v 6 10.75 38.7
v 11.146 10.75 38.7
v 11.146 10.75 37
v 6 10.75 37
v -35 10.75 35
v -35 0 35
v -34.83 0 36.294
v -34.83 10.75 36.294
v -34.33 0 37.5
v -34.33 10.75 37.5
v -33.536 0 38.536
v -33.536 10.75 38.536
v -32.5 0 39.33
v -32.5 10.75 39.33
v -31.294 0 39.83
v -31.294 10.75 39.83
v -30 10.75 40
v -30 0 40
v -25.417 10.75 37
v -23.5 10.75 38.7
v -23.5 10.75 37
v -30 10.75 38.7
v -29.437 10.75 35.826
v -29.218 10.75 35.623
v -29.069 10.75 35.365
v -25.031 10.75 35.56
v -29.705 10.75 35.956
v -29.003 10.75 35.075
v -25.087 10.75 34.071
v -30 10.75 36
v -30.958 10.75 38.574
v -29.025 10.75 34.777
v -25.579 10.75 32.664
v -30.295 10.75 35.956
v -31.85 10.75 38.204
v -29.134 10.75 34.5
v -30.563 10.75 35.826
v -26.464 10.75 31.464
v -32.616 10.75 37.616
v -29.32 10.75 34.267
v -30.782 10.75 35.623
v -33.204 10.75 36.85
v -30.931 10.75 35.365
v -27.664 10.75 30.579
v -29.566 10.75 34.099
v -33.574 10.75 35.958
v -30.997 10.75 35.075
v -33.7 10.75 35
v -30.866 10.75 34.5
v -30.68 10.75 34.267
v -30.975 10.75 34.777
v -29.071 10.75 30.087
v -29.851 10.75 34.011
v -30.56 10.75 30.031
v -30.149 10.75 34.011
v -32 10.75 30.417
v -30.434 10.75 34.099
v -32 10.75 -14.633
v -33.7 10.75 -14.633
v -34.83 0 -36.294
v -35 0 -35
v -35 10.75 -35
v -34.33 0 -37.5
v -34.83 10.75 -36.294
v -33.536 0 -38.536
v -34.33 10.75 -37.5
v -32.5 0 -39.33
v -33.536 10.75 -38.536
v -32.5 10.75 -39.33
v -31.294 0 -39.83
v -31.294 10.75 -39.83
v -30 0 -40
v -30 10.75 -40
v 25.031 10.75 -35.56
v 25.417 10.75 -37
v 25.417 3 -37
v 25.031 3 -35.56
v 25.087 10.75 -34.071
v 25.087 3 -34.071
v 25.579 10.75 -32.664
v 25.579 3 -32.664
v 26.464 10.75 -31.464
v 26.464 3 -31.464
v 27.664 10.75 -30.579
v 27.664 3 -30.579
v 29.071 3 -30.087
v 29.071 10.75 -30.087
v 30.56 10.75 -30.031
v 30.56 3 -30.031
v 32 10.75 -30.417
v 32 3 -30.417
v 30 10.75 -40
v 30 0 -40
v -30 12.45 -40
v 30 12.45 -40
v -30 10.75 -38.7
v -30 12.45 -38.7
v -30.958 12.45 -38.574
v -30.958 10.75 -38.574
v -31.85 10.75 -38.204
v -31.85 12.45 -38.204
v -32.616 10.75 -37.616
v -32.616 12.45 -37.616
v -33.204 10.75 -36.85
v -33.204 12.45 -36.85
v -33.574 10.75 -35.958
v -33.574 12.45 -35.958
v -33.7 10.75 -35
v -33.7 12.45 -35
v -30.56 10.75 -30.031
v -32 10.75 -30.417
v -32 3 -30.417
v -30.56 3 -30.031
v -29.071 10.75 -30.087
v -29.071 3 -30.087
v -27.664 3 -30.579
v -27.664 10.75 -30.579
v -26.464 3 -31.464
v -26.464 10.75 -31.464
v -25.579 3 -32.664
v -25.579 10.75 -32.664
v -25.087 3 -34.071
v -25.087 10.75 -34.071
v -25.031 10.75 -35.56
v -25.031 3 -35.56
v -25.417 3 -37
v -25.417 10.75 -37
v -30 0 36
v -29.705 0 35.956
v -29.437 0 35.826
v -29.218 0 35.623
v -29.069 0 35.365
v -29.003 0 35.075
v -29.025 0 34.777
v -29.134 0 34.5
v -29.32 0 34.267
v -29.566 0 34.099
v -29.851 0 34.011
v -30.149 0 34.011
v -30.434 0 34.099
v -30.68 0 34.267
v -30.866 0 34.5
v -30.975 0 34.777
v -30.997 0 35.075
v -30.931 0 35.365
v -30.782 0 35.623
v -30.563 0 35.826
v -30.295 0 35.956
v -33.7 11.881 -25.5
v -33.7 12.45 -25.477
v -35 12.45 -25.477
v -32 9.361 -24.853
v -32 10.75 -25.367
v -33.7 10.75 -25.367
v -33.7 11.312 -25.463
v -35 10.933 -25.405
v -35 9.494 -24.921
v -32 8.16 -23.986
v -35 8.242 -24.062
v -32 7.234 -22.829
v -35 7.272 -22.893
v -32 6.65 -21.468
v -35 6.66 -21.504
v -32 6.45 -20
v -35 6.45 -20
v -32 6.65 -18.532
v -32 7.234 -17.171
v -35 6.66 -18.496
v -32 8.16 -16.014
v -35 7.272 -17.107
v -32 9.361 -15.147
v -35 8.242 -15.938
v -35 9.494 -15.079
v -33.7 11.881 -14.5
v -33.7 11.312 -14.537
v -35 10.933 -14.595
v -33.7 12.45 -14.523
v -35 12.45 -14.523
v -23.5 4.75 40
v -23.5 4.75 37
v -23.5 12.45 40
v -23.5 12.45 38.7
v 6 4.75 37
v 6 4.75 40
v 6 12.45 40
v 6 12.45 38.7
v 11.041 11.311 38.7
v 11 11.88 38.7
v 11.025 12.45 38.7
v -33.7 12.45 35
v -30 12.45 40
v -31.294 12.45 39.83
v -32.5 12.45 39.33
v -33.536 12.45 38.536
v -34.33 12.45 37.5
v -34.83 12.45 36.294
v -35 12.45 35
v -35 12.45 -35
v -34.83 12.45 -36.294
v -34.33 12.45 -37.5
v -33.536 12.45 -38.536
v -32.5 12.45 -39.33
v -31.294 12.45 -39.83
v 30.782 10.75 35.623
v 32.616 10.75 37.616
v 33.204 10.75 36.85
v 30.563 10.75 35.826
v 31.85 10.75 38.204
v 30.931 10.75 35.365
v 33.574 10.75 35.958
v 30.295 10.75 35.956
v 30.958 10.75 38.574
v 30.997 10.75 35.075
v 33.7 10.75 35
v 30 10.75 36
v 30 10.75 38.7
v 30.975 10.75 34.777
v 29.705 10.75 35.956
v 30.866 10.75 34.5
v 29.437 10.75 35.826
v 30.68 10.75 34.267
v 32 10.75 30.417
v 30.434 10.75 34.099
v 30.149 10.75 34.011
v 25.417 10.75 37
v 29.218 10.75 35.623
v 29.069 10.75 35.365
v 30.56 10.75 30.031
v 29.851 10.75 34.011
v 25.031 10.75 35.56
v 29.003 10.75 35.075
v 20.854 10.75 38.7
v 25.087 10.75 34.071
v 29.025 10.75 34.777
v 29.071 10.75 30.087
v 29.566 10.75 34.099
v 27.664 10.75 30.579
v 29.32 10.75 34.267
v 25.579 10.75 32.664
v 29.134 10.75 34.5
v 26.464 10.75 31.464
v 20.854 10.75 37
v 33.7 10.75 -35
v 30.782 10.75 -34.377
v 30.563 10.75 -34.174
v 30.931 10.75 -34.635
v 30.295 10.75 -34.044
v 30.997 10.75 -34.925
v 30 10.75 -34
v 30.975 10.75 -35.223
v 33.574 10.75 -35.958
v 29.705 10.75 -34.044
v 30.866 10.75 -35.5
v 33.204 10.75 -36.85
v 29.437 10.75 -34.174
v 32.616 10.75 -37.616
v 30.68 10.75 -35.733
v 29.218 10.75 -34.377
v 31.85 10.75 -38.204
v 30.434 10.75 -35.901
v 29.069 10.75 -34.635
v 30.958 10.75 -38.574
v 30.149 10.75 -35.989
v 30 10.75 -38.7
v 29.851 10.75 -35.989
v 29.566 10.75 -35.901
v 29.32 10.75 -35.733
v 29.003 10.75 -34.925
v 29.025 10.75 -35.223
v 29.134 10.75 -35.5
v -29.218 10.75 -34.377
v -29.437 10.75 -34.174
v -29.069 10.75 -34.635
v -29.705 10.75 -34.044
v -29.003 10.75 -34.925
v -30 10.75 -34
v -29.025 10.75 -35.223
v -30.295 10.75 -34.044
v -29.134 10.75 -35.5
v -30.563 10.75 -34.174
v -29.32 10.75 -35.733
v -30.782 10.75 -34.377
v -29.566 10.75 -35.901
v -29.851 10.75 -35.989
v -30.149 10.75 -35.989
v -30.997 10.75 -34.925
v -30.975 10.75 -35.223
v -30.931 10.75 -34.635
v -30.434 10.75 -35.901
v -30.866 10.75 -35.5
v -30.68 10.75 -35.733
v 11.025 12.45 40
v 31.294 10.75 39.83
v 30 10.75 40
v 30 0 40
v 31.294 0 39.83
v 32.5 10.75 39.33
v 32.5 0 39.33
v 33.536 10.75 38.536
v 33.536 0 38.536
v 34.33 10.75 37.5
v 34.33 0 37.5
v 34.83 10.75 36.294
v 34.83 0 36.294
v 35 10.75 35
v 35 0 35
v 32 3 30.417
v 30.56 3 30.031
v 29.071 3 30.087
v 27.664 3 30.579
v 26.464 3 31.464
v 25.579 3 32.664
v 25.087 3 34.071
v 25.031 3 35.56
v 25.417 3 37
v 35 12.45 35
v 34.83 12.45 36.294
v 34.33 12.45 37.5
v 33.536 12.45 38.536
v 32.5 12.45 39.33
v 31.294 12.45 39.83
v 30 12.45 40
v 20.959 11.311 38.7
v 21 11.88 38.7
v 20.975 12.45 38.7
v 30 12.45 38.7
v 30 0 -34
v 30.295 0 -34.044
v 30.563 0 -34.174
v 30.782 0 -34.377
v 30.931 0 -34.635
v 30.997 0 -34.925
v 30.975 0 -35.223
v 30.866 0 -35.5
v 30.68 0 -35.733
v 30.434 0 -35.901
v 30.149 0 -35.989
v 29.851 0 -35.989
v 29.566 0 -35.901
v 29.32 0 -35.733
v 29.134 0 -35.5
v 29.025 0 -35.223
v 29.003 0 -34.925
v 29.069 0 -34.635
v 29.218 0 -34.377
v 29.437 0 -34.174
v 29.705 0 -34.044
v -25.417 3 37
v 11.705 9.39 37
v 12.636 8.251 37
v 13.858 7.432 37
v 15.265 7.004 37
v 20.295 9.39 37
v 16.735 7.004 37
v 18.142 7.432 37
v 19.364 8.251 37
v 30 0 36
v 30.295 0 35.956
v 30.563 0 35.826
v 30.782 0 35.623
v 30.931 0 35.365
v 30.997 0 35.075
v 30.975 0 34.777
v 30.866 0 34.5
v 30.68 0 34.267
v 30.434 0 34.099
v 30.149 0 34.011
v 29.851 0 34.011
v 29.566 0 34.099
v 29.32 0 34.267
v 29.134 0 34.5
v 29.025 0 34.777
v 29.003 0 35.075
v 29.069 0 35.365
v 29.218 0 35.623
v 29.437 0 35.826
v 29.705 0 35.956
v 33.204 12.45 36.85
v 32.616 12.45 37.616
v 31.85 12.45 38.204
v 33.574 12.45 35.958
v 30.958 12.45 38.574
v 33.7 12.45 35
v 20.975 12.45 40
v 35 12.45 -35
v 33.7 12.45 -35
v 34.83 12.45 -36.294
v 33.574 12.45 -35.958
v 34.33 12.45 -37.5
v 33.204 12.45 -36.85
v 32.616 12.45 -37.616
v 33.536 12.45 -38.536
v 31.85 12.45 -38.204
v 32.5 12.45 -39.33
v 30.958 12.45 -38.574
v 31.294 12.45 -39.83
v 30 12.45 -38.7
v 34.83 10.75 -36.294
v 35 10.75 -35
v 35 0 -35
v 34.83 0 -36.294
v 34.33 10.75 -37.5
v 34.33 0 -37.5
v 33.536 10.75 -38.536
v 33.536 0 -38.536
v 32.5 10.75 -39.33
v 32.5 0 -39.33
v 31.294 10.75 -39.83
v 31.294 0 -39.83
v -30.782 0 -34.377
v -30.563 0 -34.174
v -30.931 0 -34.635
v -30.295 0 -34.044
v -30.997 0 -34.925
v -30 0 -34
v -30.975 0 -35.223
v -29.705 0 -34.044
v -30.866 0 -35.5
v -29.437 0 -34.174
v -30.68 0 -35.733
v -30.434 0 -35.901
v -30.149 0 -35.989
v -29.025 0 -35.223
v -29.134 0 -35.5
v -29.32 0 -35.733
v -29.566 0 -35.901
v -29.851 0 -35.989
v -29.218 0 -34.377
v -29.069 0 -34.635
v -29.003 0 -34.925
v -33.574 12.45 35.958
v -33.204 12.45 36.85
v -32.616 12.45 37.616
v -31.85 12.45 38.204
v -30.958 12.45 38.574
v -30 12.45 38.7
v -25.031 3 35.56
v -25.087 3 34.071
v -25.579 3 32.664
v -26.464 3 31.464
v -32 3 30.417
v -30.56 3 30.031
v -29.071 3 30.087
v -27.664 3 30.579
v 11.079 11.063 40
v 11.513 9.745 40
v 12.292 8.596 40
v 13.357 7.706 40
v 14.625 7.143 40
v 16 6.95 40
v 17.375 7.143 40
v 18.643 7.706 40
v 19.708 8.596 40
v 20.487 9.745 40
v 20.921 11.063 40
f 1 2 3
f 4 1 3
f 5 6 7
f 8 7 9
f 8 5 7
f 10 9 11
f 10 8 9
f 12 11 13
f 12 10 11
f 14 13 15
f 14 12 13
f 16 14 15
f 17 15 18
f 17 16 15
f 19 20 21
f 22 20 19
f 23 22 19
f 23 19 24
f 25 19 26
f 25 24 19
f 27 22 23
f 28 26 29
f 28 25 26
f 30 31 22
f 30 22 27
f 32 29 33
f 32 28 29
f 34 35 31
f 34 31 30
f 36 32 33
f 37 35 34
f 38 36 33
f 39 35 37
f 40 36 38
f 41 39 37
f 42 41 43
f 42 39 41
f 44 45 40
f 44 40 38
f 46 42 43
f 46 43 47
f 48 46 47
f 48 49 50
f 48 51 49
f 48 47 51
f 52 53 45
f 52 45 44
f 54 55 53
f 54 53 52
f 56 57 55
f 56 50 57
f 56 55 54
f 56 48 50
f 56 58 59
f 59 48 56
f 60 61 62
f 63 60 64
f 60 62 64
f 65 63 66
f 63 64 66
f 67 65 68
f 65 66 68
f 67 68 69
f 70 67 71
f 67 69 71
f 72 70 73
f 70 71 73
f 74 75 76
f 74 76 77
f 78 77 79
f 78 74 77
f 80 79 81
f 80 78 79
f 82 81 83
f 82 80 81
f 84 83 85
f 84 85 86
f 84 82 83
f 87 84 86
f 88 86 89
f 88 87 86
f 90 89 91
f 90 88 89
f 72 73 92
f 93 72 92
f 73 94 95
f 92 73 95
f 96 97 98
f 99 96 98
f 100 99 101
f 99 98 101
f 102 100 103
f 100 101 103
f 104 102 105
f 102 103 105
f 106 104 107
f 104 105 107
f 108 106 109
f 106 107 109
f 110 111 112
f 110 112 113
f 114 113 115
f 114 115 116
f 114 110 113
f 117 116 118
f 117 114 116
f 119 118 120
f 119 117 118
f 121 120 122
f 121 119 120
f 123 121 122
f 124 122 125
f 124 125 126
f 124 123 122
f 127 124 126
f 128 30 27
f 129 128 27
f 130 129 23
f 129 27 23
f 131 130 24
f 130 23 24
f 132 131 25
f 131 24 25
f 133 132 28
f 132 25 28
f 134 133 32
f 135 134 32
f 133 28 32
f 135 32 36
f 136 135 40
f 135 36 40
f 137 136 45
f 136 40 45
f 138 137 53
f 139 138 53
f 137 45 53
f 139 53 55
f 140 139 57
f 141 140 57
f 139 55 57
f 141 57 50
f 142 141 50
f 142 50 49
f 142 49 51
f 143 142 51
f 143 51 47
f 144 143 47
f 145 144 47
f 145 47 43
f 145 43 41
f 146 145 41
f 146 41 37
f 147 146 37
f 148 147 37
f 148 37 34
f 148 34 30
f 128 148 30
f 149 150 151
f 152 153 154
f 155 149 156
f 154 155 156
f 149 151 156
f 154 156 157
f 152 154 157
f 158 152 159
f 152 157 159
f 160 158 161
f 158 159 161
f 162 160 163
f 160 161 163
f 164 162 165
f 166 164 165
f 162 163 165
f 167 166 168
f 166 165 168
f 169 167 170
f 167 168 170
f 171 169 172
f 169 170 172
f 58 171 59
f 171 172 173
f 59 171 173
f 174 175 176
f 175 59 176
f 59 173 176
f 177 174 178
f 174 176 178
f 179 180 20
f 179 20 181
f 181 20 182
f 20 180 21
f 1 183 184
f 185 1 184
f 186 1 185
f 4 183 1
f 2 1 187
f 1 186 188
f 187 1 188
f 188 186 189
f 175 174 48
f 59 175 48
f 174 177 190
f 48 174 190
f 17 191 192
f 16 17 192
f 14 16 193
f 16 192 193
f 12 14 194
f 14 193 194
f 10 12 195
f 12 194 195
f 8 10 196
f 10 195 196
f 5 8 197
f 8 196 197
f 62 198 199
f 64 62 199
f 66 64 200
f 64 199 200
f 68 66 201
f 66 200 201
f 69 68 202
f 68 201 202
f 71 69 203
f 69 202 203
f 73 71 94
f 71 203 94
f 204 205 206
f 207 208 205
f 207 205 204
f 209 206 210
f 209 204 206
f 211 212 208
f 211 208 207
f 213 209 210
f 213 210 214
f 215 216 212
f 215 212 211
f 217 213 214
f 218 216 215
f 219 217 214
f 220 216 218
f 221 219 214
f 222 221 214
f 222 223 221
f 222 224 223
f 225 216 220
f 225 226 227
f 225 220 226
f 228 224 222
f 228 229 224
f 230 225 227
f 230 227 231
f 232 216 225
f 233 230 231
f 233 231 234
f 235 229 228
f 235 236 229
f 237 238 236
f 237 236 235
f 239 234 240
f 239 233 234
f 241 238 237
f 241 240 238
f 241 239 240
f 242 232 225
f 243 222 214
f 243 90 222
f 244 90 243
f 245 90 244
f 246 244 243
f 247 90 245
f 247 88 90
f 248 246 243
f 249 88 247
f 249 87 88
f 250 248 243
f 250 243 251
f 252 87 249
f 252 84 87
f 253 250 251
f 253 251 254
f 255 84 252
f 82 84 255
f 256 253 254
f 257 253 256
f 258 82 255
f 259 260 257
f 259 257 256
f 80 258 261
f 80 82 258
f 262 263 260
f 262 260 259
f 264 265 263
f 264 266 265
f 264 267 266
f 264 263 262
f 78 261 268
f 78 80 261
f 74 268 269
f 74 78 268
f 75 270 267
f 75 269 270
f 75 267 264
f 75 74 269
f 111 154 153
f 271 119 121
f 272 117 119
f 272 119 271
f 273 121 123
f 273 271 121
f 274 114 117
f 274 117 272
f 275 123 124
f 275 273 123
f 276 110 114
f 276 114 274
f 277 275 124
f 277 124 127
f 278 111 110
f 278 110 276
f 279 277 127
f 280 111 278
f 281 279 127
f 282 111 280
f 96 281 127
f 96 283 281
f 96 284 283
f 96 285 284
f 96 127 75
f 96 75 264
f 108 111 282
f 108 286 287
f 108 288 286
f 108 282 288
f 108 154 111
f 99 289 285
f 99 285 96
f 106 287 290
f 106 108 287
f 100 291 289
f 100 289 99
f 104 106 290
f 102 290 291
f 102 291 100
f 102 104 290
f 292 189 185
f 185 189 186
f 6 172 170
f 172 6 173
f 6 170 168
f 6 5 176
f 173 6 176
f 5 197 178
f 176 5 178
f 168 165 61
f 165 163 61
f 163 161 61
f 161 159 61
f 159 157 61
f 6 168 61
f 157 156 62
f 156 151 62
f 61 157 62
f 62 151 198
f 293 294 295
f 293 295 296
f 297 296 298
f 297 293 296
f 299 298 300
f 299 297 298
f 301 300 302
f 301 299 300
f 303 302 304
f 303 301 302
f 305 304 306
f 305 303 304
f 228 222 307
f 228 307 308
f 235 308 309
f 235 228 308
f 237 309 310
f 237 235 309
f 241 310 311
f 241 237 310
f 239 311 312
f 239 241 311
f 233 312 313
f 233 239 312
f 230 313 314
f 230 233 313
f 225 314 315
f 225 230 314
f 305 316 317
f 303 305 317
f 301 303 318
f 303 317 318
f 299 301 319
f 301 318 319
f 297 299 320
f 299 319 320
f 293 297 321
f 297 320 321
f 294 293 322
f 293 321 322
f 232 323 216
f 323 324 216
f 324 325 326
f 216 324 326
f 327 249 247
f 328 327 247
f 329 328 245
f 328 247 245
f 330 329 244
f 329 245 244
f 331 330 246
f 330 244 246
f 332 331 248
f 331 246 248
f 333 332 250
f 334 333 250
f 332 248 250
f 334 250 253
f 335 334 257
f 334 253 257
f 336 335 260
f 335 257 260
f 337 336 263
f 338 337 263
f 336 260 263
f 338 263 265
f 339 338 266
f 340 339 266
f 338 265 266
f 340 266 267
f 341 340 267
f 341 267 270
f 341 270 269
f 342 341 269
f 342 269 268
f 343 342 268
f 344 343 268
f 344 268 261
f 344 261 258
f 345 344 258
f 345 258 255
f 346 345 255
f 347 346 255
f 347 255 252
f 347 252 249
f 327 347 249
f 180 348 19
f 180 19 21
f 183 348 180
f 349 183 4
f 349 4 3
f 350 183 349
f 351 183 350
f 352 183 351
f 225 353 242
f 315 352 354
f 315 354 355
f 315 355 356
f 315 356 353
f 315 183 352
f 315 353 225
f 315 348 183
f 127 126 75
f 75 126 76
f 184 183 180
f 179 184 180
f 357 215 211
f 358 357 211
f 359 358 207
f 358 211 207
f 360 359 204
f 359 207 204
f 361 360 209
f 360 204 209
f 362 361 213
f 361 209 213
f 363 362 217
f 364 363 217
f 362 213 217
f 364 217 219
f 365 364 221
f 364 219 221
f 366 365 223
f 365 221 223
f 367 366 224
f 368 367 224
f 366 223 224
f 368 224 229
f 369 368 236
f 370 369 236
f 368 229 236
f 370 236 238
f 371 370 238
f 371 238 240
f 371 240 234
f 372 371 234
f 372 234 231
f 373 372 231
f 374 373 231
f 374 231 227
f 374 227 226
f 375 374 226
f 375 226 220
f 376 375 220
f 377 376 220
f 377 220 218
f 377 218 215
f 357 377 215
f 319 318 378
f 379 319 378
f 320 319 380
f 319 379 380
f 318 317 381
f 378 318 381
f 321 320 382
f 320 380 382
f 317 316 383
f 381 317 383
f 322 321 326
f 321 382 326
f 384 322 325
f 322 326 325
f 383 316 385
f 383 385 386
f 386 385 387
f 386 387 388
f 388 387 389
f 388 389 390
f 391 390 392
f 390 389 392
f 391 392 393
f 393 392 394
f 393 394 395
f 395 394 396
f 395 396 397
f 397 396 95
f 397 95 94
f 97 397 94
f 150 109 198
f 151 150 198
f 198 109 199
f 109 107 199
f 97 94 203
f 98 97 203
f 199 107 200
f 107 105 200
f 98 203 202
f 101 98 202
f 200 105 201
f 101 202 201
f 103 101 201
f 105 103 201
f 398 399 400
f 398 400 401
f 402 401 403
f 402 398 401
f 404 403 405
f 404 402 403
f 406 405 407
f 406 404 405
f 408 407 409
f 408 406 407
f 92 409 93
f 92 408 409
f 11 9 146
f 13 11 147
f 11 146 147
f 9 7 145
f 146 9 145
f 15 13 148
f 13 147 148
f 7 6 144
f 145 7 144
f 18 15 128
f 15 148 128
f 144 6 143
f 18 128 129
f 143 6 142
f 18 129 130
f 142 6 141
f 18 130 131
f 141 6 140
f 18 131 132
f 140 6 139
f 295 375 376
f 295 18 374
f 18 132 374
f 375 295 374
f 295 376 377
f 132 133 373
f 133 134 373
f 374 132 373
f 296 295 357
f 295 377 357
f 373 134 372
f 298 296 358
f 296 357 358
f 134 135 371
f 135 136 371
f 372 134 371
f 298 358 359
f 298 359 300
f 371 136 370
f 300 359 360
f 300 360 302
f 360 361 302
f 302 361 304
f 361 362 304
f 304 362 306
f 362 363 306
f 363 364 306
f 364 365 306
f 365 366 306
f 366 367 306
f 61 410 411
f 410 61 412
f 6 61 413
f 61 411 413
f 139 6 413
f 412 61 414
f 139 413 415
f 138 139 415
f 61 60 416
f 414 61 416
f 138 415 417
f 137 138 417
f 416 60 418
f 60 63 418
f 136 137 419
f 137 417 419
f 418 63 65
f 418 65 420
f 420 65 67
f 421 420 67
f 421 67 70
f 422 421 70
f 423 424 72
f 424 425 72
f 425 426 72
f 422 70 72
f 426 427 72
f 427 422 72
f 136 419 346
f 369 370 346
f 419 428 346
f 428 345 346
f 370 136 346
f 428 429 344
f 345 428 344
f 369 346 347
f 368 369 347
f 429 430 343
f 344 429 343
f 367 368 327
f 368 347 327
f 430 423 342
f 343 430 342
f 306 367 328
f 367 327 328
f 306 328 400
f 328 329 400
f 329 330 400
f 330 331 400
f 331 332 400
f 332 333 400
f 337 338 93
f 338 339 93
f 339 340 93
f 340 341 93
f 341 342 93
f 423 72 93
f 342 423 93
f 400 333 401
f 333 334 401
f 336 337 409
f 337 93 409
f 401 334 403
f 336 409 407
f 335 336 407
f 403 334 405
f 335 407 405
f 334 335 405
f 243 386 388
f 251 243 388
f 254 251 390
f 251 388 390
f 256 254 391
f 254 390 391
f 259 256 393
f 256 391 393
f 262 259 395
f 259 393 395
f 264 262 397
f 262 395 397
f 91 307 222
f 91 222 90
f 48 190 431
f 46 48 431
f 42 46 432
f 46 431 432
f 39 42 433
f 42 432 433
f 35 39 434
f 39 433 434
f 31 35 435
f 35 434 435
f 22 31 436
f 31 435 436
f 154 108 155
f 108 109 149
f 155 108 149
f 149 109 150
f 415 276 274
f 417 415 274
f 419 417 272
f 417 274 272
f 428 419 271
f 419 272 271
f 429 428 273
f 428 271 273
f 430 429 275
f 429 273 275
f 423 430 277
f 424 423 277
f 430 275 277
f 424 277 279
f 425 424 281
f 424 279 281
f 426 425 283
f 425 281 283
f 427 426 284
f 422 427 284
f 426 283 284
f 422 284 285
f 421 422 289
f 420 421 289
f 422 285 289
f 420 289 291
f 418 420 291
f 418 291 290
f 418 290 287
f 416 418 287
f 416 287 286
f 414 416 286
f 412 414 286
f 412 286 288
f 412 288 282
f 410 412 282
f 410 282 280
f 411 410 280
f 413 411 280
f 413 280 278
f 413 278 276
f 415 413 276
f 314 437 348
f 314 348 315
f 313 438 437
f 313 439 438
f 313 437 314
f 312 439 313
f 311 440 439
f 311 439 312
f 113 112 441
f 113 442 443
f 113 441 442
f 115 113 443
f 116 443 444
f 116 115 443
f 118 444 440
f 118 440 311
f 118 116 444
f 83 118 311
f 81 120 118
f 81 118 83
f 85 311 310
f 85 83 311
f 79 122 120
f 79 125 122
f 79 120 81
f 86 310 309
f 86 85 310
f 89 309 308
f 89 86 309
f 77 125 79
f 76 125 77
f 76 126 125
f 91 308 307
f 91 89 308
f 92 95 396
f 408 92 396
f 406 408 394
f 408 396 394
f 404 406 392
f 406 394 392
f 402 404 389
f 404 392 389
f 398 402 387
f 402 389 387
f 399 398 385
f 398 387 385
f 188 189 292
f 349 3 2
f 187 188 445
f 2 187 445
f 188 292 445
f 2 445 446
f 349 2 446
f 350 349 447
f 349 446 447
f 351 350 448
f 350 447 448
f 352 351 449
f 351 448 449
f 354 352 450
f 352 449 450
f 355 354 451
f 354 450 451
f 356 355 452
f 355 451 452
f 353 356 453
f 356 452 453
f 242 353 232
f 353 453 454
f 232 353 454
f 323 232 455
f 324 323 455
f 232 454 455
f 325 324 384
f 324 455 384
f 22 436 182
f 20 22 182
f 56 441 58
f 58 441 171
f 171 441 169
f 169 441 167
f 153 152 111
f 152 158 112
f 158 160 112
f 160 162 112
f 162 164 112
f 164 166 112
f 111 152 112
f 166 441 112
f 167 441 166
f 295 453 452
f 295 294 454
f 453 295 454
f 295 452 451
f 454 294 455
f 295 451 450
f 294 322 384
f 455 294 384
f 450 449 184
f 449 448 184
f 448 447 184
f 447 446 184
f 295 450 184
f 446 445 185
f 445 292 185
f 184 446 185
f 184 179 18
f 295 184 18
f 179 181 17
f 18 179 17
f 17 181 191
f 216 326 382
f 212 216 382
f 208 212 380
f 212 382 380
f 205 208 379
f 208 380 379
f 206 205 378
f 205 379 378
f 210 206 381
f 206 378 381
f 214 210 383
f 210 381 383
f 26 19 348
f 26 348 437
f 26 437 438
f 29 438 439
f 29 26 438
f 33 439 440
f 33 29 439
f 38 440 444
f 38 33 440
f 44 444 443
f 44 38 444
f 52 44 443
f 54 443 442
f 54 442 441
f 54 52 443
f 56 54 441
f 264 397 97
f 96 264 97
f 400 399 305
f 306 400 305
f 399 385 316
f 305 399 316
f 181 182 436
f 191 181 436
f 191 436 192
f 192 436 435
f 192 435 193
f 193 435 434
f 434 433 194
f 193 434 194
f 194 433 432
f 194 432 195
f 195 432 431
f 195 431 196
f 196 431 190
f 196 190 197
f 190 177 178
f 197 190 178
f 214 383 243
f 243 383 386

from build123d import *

# Parameters (mm, degrees)
SKETCH1_W               = 70
SKETCH1_H               = 80
BOSS_EXTRUDE1_DEPTH     = 21.5
FILLET1_R               = 5
SHELL1_T                = 3
BOSS_EXTRUDE2_REACH     = 59.335
SKETCH3_R               = 5
SPLIT2_SURFACE_1_BACK   = 109.454
SPLIT2_SURFACE_1_DEPTH  = 218.908
SPLIT2_SURFACE_2_BACK   = 109.454
SPLIT2_SURFACE_2_DEPTH  = 218.908
SKETCH4_R               = 1
CUT_EXTRUDE1_DEPTH      = 58.334544561
SKETCH5_R               = 3
CUT_EXTRUDE2_DEPTH      = 7.75
SKETCH6_OUTSIDE_W       = 93.69
SKETCH6_OUTSIDE_H       = 103.69
CUT_EXTRUDE3_DEPTH      = 2
BOSS_EXTRUDE3_START     = 1.7
BOSS_EXTRUDE3_DEPTH     = 1.7
SKETCH8_R               = 5.5
CUT_EXTRUDE4_DEPTH      = 10
SKETCH9_R               = 5
SKETCH9_W               = 20
SKETCH9_H               = 12
CUT_EXTRUDE5_DEPTH      = 10
BOSS_EXTRUDE4_OUTLINE_W = 20
BOSS_EXTRUDE4_OUTLINE_H = 1.5
BOSS_EXTRUDE4_DEPTH     = 7.75
SKETCH12_W              = 29.5
SKETCH12_H              = 12
CUT_EXTRUDE6_DEPTH      = 10
BOSS_EXTRUDE5_DEPTH     = 5


# Read off the part's stored shape, not the designer's step: Boss-Extrude4
with BuildPart() as part:
    # Sketch1 → Boss-Extrude1 (new body)
    with BuildSketch(Plane(origin=(0, 0, 0), x_dir=(1, 0, 0), z_dir=(0, 1, 0))):
        Rectangle(SKETCH1_W, SKETCH1_H)
    extrude(amount=BOSS_EXTRUDE1_DEPTH)

    # Fillet1
    fillet1_edges = [part.edges().sort_by_distance(p)[0] for p in [
        (-35, 10.75, -40),
        (35, 10.75, -40),
        (35, 10.75, 40),
        (-35, 10.75, 40),
    ]]
    fillet(fillet1_edges, radius=FILLET1_R)

    # Shell1 (no face opened: a closed hollow body)
    add(offset(amount=-SHELL1_T, mode=Mode.PRIVATE), mode=Mode.SUBTRACT)

    # Sketch3 → Boss-Extrude2 (add, up to next)
    with BuildSketch(Plane(origin=(0, 21.5, 0), x_dir=(1, 0, 0), z_dir=(0, 1, 0)), mode=Mode.PRIVATE) as boss_extrude2_sk1:
        with Locations((-30, 35)):
            Circle(SKETCH3_R)
    boss_extrude2_tool1 = extrude(boss_extrude2_sk1.sketch, amount=-BOSS_EXTRUDE2_REACH, mode=Mode.PRIVATE) - part.part
    # Sketch3 → Boss-Extrude2 (add, up to next)
    with BuildSketch(Plane(origin=(0, 21.5, 0), x_dir=(1, 0, 0), z_dir=(0, 1, 0)), mode=Mode.PRIVATE) as boss_extrude2_sk2:
        with Locations((30, 35)):
            Circle(SKETCH3_R)
    boss_extrude2_tool2 = extrude(boss_extrude2_sk2.sketch, amount=-BOSS_EXTRUDE2_REACH, mode=Mode.PRIVATE) - part.part
    # Sketch3 → Boss-Extrude2 (add, up to next)
    with BuildSketch(Plane(origin=(0, 21.5, 0), x_dir=(1, 0, 0), z_dir=(0, 1, 0)), mode=Mode.PRIVATE) as boss_extrude2_sk3:
        with Locations((30, -35)):
            Circle(SKETCH3_R)
    boss_extrude2_tool3 = extrude(boss_extrude2_sk3.sketch, amount=-BOSS_EXTRUDE2_REACH, mode=Mode.PRIVATE) - part.part
    # Sketch3 → Boss-Extrude2 (add, up to next)
    with BuildSketch(Plane(origin=(0, 21.5, 0), x_dir=(1, 0, 0), z_dir=(0, 1, 0)), mode=Mode.PRIVATE) as boss_extrude2_sk4:
        with Locations((-30, -35)):
            Circle(SKETCH3_R)
    boss_extrude2_tool4 = extrude(boss_extrude2_sk4.sketch, amount=-BOSS_EXTRUDE2_REACH, mode=Mode.PRIVATE) - part.part
    add(boss_extrude2_tool1.solids().sort_by_distance((-30, 21.5, -35))[0])
    add(boss_extrude2_tool2.solids().sort_by_distance((30, 21.5, -35))[0])
    add(boss_extrude2_tool3.solids().sort_by_distance((30, 21.5, 35))[0])
    add(boss_extrude2_tool4.solids().sort_by_distance((-30, 21.5, 35))[0])


with BuildPart() as body_2:
    # Split2: the piece behind the surface
    add(part.part)
    # Split2 surface: a surface, the sketch's curves swept straight by 218.908 mm
    with BuildLine(Plane(origin=(0, 0, 0), x_dir=(0, 0, -1), z_dir=(1, 0, 0)).offset(-SPLIT2_SURFACE_1_BACK), mode=Mode.PRIVATE) as split2_surface_1_path:
        Line((-40, 10.75), (51.562362236, 10.75))
    split2_surface_1 = Shell.extrude(split2_surface_1_path.wire(), (1 * SPLIT2_SURFACE_1_DEPTH, 0 * SPLIT2_SURFACE_1_DEPTH, 0 * SPLIT2_SURFACE_1_DEPTH))
    split(bisect_by=split2_surface_1, keep=Keep.BOTTOM)


with BuildPart() as part_1:
    add(part.part)

    # Split2: split by a surface, the side it looks to stays
    # Split2 surface: a surface, the sketch's curves swept straight by 218.908 mm
    with BuildLine(Plane(origin=(0, 0, 0), x_dir=(0, 0, -1), z_dir=(1, 0, 0)).offset(-SPLIT2_SURFACE_2_BACK), mode=Mode.PRIVATE) as split2_surface_2_path:
        Line((-40, 10.75), (51.562362236, 10.75))
    split2_surface_2 = Shell.extrude(split2_surface_2_path.wire(), (1 * SPLIT2_SURFACE_2_DEPTH, 0 * SPLIT2_SURFACE_2_DEPTH, 0 * SPLIT2_SURFACE_2_DEPTH))
    split(bisect_by=split2_surface_2, keep=Keep.TOP)


with BuildPart() as cut_extrude1_tool:
    # Sketch4 → Cut-Extrude1 (new, through all)
    with BuildSketch(Plane(origin=(0, 21.5, 0), x_dir=(1, 0, 0), z_dir=(0, 1, 0))):
        with Locations(Location((-30, 35, 0), (0, 0, 270))):
            Circle(SKETCH4_R)
        with Locations(Location((30, 35, 0), (0, 0, 270))):
            Circle(SKETCH4_R)
        with Locations(Location((30, -35, 0), (0, 0, 270))):
            Circle(SKETCH4_R)
        with Locations(Location((-30, -35, 0), (0, 0, 270))):
            Circle(SKETCH4_R)
    extrude(amount=-CUT_EXTRUDE1_DEPTH)


with BuildPart() as part_2:
    add(part_1.part)

    # Cut-Extrude1: cut by cut_extrude1_tool
    add(cut_extrude1_tool.part, mode=Mode.SUBTRACT)

    # Sketch5 → Cut-Extrude2 (cut)
    with BuildSketch(Plane(origin=(0, 21.5, 0), x_dir=(1, 0, 0), z_dir=(0, 1, 0))):
        with Locations(Location((-30, 35, 0), (0, 0, 270))):
            Circle(SKETCH5_R)
        with Locations(Location((30, 35, 0), (0, 0, 270))):
            Circle(SKETCH5_R)
        with Locations(Location((30, -35, 0), (0, 0, 270))):
            Circle(SKETCH5_R)
        with Locations(Location((-30, -35, 0), (0, 0, 270))):
            Circle(SKETCH5_R)
    extrude(amount=-CUT_EXTRUDE2_DEPTH, mode=Mode.SUBTRACT)

    # Sketch6 outside → Cut-Extrude3 (cut)
    with BuildSketch(Plane.XZ.offset(-10.75)):
        Rectangle(SKETCH6_OUTSIDE_W, SKETCH6_OUTSIDE_H)
        with BuildLine():
            Line((-30, -38.5), (30, -38.5))
            ThreePointArc((30, -38.5), (32.474873734, -37.474873734), (33.5, -35))
            Line((33.5, -35), (33.5, 35))
            ThreePointArc((33.5, 35), (32.474873734, 37.474873734), (30, 38.5))
            Line((30, 38.5), (-30, 38.5))
            ThreePointArc((-30, 38.5), (-32.474873734, 37.474873734), (-33.5, 35))
            Line((-33.5, 35), (-33.5, -35))
            ThreePointArc((-33.5, -35), (-32.474873734, -37.474873734), (-30, -38.5))
        make_face(mode=Mode.SUBTRACT)
    extrude(amount=-CUT_EXTRUDE3_DEPTH, mode=Mode.SUBTRACT)


with BuildPart() as body_2_1:
    add(body_2.part)

    # Cut-Extrude1: cut by cut_extrude1_tool
    add(cut_extrude1_tool.part, mode=Mode.SUBTRACT)

    # Sketch7 → Boss-Extrude3 (add)
    with BuildSketch(Plane(origin=(0, 10.75, 0), x_dir=(1, 0, 0), z_dir=(0, 1, 0)).offset(BOSS_EXTRUDE3_START)):
        with BuildLine():
            Line((-30, 40), (30, 40))
            ThreePointArc((30, 40), (33.535533906, 38.535533906), (35, 35))
            Line((35, 35), (35, -35))
            ThreePointArc((35, -35), (33.535533906, -38.535533906), (30, -40))
            Line((30, -40), (-30, -40))
            ThreePointArc((-30, -40), (-33.535533906, -38.535533906), (-35, -35))
            Line((-35, -35), (-35, 35))
            ThreePointArc((-35, 35), (-33.535533906, 38.535533906), (-30, 40))
        make_face()
        with BuildLine():
            Line((30, 38.7), (-30, 38.7))
            ThreePointArc((-30, 38.7), (-32.61629509, 37.61629509), (-33.7, 35))
            Line((-33.7, 35), (-33.7, -35))
            ThreePointArc((-33.7, -35), (-32.61629509, -37.61629509), (-30, -38.7))
            Line((-30, -38.7), (30, -38.7))
            ThreePointArc((30, -38.7), (32.61629509, -37.61629509), (33.7, -35))
            Line((33.7, -35), (33.7, 35))
            ThreePointArc((33.7, 35), (32.61629509, 37.61629509), (30, 38.7))
        make_face(mode=Mode.SUBTRACT)
    extrude(amount=-BOSS_EXTRUDE3_DEPTH)


with BuildPart() as cut_extrude4_tool:
    # Sketch8 → Cut-Extrude4 (new body)
    with BuildSketch(Plane.ZY.offset(35)):
        with Locations((-20, 11.95)):
            Circle(SKETCH8_R)
    extrude(amount=-CUT_EXTRUDE4_DEPTH)


with BuildPart() as part_3:
    add(part_2.part)

    # Cut-Extrude4: cut by cut_extrude4_tool
    add(cut_extrude4_tool.part, mode=Mode.SUBTRACT)


with BuildPart() as body_2_2:
    add(body_2_1.part)

    # Cut-Extrude4: cut by cut_extrude4_tool
    add(cut_extrude4_tool.part, mode=Mode.SUBTRACT)


with BuildPart() as cut_extrude5_tool:
    # Sketch9 → Cut-Extrude5 (new body)
    with BuildSketch(Plane.XY.offset(40)):
        with Locations((16, 11.95)):
            Circle(SKETCH9_R)
        with Locations((-10, 10.75)):
            Rectangle(SKETCH9_W, SKETCH9_H)
    extrude(amount=-CUT_EXTRUDE5_DEPTH)


with BuildPart() as part_4:
    add(part_3.part)

    # Cut-Extrude5: cut by cut_extrude5_tool
    add(cut_extrude5_tool.part, mode=Mode.SUBTRACT)

    # Boss-Extrude4 outline → Boss-Extrude4 (add)
    with BuildSketch(Plane.XZ.offset(-18.5)):
        Polygon((10.5, 37), (7.5, 37), (7.5, 35), (6, 35), (6, 32), (10.5, 32), align=None)
        with Locations((-10, 37.75)):
            Rectangle(BOSS_EXTRUDE4_OUTLINE_W, BOSS_EXTRUDE4_OUTLINE_H)
        with BuildLine():
            Line((-23.5, 35), (-25, 35))
            ThreePointArc((-25, 35), (-25.25658351, 33.41886117), (-26, 32))
            Line((-26, 32), (-23.5, 32))
            Line((-23.5, 32), (-23.5, 35))
        make_face()
        with BuildLine():
            Line((-25, 35), (-25, 37))
            Line((-25, 37), (-25.417424305, 37))
            ThreePointArc((-25.417424305, 37), (-25.105468435, 36.021548218), (-25, 35))
        make_face()
        with BuildLine():
            Line((-28, 37.236067977), (-28, 32.763932023))
            ThreePointArc((-28, 32.763932023), (-27, 35), (-28, 37.236067977))
        make_face()
    extrude(amount=BOSS_EXTRUDE4_DEPTH)


with BuildPart() as body_2_3:
    add(body_2_2.part)

    # Cut-Extrude5: cut by cut_extrude5_tool
    add(cut_extrude5_tool.part, mode=Mode.SUBTRACT)


with BuildPart() as cut_extrude6_tool:
    # Sketch12 → Cut-Extrude6 (new body)
    with BuildSketch(Plane(origin=(0, 0, 37), x_dir=(-1, 0, 0), z_dir=(0, 0, -1))):
        with Locations((8.75, 10.75)):
            Rectangle(SKETCH12_W, SKETCH12_H)
    extrude(amount=-CUT_EXTRUDE6_DEPTH)


with BuildPart() as part_5:
    add(part_4.part)

    # Cut-Extrude6: cut by cut_extrude6_tool
    add(cut_extrude6_tool.part, mode=Mode.SUBTRACT)

    # Sketch14 → Boss-Extrude5 (add)
    with BuildSketch(Plane.XZ.offset(-10.75)):
        Polygon((10.5, 36.8), (7.5, 36.8), (7.5, 35), (6, 35), (6, 32), (10.5, 32), align=None)
    extrude(amount=BOSS_EXTRUDE5_DEPTH)


with BuildPart() as body_2_4:
    add(body_2_3.part)

    # Cut-Extrude6: cut by cut_extrude6_tool
    add(cut_extrude6_tool.part, mode=Mode.SUBTRACT)


solid = body_2_4.part
